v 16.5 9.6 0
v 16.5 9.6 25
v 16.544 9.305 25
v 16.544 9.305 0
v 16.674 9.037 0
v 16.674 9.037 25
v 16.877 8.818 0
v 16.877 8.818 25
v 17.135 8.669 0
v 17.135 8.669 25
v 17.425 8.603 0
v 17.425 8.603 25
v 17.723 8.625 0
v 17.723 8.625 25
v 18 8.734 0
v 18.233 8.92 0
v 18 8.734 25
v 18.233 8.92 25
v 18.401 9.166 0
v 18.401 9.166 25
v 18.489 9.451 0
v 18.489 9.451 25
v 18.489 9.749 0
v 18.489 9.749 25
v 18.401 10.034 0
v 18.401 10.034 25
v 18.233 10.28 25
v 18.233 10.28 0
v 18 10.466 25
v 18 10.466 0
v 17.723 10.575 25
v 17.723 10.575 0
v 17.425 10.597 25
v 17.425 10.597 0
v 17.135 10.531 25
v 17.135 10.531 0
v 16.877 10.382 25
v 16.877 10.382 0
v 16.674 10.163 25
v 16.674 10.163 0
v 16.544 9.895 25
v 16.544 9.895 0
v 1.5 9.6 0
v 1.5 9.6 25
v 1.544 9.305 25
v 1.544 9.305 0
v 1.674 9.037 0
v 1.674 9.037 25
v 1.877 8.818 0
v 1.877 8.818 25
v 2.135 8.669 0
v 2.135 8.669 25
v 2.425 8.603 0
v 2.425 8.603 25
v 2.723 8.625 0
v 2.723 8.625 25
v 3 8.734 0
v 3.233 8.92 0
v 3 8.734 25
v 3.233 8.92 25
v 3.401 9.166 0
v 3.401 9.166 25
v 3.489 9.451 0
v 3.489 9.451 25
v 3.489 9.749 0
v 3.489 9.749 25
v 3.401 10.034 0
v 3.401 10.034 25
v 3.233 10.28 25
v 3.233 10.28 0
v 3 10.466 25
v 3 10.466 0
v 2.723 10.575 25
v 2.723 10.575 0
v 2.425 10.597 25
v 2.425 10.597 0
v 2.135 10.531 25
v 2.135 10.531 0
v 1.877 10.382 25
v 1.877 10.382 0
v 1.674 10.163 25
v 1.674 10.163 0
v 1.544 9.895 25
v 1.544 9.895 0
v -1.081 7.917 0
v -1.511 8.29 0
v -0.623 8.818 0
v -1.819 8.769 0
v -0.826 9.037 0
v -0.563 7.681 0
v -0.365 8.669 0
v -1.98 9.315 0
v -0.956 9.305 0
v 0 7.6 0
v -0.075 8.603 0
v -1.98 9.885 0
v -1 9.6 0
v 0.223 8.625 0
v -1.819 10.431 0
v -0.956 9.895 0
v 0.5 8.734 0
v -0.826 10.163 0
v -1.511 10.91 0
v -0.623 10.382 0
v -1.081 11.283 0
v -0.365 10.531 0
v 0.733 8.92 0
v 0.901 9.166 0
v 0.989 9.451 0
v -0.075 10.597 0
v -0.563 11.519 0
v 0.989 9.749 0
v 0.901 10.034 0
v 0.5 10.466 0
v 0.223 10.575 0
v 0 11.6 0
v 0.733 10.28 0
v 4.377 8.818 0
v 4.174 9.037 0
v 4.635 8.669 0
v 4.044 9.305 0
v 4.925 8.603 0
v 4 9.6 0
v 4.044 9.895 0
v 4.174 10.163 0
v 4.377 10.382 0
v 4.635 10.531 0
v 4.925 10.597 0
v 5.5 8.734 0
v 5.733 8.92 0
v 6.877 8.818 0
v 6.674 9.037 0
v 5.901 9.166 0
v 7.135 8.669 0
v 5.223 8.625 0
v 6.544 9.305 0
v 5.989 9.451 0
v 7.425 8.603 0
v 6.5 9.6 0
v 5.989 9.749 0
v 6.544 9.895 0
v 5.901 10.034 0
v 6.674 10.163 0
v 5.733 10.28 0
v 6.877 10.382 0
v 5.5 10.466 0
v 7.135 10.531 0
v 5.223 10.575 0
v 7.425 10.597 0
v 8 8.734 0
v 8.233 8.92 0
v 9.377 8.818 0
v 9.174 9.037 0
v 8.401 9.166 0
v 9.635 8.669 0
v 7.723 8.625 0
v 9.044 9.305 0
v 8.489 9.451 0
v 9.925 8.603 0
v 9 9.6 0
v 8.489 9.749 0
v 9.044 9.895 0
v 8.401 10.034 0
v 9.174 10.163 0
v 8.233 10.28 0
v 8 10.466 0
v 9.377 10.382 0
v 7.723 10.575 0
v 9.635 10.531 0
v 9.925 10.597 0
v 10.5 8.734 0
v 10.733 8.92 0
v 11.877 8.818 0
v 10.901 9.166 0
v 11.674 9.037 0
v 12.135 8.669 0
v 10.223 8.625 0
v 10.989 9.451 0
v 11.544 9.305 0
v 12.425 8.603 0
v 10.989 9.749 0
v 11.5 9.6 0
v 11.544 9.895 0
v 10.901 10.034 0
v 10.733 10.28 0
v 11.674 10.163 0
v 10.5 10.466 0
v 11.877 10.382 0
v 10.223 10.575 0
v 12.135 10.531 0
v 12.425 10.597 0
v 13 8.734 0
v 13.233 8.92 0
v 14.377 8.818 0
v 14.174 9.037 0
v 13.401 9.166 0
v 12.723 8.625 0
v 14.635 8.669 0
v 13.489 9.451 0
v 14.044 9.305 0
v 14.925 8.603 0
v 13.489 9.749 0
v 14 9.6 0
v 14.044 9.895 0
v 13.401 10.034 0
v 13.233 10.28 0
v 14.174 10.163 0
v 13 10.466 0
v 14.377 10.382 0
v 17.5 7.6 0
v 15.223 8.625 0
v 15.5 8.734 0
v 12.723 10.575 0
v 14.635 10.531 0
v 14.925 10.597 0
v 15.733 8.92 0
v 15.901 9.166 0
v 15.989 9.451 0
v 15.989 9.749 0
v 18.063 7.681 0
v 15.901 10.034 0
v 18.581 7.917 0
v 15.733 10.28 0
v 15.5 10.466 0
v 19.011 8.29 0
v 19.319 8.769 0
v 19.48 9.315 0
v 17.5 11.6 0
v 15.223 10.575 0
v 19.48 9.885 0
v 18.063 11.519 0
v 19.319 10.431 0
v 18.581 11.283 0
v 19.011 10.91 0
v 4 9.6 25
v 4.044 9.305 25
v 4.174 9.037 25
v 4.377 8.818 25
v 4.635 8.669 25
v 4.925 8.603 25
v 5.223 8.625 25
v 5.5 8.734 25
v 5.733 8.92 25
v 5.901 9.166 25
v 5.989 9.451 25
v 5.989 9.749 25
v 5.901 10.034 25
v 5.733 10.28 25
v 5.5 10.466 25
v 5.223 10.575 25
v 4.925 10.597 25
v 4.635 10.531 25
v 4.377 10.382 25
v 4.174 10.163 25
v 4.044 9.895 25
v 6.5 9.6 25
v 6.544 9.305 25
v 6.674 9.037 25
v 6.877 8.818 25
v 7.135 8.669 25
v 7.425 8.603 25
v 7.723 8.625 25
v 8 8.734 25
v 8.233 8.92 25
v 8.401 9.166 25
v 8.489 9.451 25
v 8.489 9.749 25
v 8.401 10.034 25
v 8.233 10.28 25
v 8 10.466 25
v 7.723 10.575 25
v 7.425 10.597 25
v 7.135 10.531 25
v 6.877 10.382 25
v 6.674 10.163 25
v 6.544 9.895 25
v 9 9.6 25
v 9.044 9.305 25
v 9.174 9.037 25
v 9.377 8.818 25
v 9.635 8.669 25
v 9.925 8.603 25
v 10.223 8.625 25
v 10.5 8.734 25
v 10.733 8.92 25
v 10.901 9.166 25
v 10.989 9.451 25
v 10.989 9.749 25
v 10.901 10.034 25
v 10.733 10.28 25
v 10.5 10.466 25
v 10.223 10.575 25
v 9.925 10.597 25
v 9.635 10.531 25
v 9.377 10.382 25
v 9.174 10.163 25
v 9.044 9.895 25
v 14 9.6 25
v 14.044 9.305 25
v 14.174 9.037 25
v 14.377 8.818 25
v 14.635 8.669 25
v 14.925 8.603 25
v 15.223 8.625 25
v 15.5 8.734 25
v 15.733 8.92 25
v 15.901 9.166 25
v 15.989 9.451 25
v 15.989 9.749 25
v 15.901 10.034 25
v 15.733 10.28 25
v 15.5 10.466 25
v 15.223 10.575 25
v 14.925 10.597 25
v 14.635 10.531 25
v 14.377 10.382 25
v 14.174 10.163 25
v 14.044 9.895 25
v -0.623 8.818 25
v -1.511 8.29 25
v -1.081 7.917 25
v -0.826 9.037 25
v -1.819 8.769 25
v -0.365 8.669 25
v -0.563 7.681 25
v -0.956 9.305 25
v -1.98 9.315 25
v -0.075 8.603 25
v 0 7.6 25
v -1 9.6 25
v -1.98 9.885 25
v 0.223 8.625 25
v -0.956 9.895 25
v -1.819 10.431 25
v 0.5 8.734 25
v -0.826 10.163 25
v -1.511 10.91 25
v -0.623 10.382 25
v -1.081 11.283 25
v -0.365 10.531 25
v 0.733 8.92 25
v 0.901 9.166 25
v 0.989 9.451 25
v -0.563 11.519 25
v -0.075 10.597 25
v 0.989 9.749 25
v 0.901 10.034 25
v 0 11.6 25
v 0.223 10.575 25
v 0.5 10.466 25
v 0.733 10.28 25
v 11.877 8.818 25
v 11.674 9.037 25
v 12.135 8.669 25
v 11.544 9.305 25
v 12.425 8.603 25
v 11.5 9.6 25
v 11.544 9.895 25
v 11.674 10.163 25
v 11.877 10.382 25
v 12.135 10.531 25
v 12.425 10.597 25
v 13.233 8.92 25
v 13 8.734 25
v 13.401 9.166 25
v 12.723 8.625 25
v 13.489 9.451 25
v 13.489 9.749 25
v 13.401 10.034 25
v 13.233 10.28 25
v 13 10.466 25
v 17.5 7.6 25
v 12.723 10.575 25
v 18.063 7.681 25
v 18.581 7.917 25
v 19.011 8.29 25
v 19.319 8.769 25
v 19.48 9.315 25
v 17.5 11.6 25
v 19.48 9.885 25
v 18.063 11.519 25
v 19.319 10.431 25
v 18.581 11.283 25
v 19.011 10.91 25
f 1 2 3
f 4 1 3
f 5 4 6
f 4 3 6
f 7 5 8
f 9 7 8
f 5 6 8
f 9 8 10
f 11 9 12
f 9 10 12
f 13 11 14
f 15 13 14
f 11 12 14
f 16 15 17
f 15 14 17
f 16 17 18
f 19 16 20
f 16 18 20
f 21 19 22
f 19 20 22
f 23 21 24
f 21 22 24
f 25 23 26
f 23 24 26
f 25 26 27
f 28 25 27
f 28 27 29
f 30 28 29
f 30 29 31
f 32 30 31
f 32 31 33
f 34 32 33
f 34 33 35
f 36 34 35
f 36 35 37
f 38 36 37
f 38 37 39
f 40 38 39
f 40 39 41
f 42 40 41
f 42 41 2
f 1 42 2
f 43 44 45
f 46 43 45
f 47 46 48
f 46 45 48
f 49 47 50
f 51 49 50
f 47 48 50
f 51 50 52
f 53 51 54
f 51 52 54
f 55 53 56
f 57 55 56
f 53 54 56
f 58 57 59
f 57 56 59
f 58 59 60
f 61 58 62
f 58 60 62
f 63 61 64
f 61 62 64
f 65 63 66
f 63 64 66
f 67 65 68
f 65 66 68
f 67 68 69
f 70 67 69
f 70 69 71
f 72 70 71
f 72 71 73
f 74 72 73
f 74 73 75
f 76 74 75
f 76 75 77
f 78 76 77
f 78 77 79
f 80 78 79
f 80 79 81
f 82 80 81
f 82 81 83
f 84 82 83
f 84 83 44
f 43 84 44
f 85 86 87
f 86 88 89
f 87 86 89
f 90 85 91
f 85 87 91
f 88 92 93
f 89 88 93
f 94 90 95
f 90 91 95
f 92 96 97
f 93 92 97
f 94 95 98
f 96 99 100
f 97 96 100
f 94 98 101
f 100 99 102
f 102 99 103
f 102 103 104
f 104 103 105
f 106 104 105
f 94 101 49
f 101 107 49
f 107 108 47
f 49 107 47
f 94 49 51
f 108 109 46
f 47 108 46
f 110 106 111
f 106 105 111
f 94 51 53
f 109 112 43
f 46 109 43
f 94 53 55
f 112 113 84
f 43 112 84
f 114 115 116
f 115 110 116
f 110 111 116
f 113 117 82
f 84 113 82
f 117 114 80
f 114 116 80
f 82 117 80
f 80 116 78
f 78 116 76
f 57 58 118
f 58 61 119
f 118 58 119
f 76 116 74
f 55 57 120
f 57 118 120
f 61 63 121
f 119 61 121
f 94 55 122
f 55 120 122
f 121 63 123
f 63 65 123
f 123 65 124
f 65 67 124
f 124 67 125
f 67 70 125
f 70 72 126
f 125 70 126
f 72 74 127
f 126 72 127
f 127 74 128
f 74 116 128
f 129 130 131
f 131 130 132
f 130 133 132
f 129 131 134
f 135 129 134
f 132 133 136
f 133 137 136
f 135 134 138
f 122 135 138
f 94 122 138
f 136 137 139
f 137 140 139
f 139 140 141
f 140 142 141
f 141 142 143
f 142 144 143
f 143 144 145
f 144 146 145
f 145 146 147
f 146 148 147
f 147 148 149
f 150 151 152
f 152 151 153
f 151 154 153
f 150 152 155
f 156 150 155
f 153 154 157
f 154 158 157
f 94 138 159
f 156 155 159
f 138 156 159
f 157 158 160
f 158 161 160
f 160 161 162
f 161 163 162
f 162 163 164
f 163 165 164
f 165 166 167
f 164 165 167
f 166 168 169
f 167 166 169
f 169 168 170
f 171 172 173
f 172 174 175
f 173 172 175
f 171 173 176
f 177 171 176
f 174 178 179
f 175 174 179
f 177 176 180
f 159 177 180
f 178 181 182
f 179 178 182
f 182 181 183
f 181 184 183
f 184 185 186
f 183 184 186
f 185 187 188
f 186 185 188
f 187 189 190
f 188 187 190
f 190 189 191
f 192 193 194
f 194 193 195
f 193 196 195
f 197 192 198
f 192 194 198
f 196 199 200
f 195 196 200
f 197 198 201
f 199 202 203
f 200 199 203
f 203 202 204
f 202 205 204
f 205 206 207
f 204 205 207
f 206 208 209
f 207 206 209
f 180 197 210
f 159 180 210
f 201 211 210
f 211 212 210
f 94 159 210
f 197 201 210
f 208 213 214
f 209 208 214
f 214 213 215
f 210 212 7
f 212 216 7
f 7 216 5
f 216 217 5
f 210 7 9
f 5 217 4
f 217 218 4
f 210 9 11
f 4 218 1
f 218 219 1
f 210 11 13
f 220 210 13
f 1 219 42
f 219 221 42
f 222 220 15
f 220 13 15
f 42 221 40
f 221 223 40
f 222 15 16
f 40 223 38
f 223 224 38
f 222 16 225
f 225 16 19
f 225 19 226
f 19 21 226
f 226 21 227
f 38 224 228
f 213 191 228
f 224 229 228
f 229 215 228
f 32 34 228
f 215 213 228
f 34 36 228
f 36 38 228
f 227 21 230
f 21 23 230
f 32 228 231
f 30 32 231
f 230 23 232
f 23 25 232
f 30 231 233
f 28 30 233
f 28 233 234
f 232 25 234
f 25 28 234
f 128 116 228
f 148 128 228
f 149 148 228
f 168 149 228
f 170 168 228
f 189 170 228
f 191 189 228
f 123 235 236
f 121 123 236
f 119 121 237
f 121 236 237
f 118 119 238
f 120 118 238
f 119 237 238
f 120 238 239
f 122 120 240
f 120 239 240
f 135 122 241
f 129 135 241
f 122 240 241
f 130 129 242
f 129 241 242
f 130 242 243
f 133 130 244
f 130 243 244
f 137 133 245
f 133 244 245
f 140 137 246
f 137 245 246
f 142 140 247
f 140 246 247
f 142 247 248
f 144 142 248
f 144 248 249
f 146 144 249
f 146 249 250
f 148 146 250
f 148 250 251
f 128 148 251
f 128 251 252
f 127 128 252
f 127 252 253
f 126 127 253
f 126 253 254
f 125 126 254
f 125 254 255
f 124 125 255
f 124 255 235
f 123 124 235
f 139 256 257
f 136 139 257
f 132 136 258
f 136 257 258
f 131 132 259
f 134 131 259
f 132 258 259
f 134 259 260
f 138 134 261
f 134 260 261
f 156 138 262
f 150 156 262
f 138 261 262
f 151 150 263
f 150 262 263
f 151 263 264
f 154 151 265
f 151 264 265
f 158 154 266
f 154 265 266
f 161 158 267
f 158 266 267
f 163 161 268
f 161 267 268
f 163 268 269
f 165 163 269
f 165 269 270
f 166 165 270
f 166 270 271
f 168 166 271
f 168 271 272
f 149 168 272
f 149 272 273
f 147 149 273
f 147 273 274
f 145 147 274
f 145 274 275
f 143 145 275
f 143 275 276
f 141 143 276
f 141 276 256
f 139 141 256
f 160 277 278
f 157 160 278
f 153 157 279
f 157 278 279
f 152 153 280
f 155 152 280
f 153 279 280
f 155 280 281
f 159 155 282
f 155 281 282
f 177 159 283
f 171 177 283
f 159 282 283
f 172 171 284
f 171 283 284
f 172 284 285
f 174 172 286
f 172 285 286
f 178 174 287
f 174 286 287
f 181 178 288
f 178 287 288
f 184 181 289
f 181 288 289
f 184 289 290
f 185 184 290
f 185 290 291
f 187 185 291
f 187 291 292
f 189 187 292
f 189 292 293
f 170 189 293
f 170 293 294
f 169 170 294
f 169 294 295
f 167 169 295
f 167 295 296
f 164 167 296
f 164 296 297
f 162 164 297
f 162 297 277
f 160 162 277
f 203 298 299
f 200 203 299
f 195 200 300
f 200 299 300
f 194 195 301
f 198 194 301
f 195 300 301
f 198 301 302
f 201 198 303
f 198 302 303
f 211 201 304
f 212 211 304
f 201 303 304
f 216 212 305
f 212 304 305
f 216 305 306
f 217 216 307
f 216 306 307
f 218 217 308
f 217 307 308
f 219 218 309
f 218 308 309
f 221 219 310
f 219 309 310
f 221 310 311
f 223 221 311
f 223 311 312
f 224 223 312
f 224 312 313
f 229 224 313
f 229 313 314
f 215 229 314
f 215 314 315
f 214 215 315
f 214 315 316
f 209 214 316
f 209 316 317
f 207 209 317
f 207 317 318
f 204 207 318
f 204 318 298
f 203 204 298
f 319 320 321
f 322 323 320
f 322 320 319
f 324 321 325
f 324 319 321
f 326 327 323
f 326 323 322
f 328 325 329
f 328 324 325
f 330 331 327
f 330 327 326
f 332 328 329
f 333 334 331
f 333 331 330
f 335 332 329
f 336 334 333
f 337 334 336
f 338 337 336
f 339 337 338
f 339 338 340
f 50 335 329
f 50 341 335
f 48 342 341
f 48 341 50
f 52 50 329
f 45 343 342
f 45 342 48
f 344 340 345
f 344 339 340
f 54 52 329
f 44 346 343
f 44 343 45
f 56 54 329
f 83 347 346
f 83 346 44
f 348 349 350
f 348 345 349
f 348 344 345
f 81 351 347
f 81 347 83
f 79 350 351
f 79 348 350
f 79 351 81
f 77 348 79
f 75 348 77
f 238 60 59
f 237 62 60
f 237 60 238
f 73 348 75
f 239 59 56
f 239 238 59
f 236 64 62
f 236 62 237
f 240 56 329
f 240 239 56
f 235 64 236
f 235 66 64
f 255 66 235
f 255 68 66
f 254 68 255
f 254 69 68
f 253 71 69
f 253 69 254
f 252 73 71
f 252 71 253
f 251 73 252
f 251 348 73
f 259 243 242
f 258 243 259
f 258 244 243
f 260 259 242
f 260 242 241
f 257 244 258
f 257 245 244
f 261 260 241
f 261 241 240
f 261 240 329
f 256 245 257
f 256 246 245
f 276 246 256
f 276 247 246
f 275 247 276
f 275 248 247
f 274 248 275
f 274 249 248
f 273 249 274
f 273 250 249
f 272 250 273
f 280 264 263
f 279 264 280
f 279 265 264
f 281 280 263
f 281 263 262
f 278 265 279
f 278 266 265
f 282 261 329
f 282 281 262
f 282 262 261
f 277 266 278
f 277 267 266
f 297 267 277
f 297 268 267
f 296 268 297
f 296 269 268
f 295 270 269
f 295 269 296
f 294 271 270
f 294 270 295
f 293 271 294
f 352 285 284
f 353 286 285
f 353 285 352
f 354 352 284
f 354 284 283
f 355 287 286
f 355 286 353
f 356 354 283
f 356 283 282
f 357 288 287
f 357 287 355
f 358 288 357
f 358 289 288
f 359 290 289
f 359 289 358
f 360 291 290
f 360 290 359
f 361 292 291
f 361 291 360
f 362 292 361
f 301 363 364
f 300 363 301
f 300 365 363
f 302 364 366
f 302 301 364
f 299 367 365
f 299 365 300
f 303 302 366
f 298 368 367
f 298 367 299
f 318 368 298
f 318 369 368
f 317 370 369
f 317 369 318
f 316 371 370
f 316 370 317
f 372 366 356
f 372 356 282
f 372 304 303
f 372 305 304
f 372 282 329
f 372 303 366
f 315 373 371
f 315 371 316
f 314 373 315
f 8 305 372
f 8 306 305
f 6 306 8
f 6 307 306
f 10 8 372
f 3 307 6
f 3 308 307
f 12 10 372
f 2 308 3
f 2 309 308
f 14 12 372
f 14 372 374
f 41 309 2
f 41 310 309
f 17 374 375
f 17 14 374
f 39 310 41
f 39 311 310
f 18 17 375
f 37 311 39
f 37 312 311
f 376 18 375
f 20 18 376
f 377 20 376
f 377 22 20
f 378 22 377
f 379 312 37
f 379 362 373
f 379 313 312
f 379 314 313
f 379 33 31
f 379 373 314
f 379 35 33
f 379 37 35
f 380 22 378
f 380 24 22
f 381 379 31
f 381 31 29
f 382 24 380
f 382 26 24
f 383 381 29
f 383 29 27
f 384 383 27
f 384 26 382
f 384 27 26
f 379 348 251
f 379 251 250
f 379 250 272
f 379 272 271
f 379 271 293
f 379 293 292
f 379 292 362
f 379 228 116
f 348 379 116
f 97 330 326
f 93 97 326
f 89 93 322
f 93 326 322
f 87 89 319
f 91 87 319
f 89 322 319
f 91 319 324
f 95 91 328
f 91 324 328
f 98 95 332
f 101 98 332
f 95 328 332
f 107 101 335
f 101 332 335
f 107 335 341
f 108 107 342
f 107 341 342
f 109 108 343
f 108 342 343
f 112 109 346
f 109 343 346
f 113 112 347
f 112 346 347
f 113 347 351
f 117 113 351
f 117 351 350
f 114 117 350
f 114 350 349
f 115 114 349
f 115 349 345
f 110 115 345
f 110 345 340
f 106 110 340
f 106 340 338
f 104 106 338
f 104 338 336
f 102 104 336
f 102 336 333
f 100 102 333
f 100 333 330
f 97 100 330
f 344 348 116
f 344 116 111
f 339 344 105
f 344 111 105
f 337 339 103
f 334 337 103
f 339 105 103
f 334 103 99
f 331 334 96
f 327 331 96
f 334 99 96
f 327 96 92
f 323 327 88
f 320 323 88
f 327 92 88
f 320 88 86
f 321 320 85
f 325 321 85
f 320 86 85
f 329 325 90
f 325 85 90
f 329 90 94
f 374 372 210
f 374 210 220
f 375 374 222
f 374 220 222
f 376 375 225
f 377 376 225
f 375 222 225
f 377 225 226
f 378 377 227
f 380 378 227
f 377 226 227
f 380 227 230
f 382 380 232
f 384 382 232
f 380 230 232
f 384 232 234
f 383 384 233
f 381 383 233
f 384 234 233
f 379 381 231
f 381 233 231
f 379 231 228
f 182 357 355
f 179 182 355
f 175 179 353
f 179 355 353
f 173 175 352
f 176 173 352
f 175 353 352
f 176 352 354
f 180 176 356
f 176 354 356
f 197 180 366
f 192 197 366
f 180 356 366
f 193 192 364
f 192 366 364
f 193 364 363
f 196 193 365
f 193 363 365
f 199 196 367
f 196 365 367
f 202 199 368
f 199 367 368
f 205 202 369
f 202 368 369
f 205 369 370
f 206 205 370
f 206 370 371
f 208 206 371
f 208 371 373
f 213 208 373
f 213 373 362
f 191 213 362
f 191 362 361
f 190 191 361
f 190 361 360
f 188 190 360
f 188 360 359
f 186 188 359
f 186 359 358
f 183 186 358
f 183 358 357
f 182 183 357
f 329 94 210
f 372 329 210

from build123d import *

# Parameters (mm, degrees)
F1_DEPTH = 25
F2_D     = 2


with BuildPart() as f1:
    # F0 (on Top) → F1 (new body)
    with BuildSketch(Plane.XY):
        with BuildLine():
            ThreePointArc((0, 11.6000010935), (-2, 9.6000010935), (0, 7.6000010935))
            Line((0, 7.6000010935), (17.5, 7.6000010935))
            ThreePointArc((17.5, 7.6000010935), (19.5, 9.6000010935), (17.5, 11.6000010935))
            Line((17.5, 11.6000010935), (0, 11.6000010935))
        make_face()
    extrude(amount=F1_DEPTH)

    # F2 (through all)
    with Locations(Plane(origin=(0, 0, 0), x_dir=(1, 0, 0), z_dir=(0, 0, -1))):
        with Locations((0, -9.6000010935), (2.5, -9.6000010935), (5, -9.6000010935), (7.5, -9.6000010935), (10, -9.6000010935), (12.5, -9.6000010935), (15, -9.6000010935), (17.5, -9.6000010935)):
            Hole(F2_D / 2)


solid = f1.part
